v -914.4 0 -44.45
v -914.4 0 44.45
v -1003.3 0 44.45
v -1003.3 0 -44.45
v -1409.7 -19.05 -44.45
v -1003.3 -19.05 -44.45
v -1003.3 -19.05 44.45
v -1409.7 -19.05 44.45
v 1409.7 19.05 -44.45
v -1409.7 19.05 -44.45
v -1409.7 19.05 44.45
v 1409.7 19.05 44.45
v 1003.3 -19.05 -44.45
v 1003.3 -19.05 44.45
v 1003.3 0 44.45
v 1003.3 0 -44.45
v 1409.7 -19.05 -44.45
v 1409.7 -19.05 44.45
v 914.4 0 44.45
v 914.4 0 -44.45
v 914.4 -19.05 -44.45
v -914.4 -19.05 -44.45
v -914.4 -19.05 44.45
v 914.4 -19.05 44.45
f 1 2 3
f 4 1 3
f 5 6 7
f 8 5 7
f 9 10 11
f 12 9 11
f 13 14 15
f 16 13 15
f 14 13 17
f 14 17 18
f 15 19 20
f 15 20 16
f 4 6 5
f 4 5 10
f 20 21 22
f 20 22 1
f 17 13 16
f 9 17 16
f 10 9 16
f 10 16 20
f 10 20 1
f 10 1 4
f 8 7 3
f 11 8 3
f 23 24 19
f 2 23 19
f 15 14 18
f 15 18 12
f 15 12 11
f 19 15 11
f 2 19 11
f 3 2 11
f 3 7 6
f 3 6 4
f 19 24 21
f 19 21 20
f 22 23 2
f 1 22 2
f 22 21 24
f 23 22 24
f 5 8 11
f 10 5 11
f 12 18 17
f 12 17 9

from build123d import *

# Parameters (mm, degrees)
F0_W     = 38.1
F0_H     = 88.9
F1_DEPTH = 1409.7
F2_W     = 88.9
F2_H     = 19.05
F3_DEPTH = 88.9


with BuildPart() as f1:
    # F0 (on Right) → F1 (new body)
    with BuildSketch(Plane.YZ):
        Rectangle(F0_W, F0_H)
    extrude(amount=F1_DEPTH)

    # F2 (on face) → F3 (cut, through all)
    with BuildSketch(Plane.XY.offset(44.45)):
        with Locations((958.85, -9.525)):
            Rectangle(F2_W, F2_H)
    extrude(amount=-F3_DEPTH, mode=Mode.SUBTRACT)

    # F4: F1 across plane


with BuildPart() as f1_1:
    add(f1.part)
    add(f1.part.mirror(Plane.YZ))


solid = f1_1.part
